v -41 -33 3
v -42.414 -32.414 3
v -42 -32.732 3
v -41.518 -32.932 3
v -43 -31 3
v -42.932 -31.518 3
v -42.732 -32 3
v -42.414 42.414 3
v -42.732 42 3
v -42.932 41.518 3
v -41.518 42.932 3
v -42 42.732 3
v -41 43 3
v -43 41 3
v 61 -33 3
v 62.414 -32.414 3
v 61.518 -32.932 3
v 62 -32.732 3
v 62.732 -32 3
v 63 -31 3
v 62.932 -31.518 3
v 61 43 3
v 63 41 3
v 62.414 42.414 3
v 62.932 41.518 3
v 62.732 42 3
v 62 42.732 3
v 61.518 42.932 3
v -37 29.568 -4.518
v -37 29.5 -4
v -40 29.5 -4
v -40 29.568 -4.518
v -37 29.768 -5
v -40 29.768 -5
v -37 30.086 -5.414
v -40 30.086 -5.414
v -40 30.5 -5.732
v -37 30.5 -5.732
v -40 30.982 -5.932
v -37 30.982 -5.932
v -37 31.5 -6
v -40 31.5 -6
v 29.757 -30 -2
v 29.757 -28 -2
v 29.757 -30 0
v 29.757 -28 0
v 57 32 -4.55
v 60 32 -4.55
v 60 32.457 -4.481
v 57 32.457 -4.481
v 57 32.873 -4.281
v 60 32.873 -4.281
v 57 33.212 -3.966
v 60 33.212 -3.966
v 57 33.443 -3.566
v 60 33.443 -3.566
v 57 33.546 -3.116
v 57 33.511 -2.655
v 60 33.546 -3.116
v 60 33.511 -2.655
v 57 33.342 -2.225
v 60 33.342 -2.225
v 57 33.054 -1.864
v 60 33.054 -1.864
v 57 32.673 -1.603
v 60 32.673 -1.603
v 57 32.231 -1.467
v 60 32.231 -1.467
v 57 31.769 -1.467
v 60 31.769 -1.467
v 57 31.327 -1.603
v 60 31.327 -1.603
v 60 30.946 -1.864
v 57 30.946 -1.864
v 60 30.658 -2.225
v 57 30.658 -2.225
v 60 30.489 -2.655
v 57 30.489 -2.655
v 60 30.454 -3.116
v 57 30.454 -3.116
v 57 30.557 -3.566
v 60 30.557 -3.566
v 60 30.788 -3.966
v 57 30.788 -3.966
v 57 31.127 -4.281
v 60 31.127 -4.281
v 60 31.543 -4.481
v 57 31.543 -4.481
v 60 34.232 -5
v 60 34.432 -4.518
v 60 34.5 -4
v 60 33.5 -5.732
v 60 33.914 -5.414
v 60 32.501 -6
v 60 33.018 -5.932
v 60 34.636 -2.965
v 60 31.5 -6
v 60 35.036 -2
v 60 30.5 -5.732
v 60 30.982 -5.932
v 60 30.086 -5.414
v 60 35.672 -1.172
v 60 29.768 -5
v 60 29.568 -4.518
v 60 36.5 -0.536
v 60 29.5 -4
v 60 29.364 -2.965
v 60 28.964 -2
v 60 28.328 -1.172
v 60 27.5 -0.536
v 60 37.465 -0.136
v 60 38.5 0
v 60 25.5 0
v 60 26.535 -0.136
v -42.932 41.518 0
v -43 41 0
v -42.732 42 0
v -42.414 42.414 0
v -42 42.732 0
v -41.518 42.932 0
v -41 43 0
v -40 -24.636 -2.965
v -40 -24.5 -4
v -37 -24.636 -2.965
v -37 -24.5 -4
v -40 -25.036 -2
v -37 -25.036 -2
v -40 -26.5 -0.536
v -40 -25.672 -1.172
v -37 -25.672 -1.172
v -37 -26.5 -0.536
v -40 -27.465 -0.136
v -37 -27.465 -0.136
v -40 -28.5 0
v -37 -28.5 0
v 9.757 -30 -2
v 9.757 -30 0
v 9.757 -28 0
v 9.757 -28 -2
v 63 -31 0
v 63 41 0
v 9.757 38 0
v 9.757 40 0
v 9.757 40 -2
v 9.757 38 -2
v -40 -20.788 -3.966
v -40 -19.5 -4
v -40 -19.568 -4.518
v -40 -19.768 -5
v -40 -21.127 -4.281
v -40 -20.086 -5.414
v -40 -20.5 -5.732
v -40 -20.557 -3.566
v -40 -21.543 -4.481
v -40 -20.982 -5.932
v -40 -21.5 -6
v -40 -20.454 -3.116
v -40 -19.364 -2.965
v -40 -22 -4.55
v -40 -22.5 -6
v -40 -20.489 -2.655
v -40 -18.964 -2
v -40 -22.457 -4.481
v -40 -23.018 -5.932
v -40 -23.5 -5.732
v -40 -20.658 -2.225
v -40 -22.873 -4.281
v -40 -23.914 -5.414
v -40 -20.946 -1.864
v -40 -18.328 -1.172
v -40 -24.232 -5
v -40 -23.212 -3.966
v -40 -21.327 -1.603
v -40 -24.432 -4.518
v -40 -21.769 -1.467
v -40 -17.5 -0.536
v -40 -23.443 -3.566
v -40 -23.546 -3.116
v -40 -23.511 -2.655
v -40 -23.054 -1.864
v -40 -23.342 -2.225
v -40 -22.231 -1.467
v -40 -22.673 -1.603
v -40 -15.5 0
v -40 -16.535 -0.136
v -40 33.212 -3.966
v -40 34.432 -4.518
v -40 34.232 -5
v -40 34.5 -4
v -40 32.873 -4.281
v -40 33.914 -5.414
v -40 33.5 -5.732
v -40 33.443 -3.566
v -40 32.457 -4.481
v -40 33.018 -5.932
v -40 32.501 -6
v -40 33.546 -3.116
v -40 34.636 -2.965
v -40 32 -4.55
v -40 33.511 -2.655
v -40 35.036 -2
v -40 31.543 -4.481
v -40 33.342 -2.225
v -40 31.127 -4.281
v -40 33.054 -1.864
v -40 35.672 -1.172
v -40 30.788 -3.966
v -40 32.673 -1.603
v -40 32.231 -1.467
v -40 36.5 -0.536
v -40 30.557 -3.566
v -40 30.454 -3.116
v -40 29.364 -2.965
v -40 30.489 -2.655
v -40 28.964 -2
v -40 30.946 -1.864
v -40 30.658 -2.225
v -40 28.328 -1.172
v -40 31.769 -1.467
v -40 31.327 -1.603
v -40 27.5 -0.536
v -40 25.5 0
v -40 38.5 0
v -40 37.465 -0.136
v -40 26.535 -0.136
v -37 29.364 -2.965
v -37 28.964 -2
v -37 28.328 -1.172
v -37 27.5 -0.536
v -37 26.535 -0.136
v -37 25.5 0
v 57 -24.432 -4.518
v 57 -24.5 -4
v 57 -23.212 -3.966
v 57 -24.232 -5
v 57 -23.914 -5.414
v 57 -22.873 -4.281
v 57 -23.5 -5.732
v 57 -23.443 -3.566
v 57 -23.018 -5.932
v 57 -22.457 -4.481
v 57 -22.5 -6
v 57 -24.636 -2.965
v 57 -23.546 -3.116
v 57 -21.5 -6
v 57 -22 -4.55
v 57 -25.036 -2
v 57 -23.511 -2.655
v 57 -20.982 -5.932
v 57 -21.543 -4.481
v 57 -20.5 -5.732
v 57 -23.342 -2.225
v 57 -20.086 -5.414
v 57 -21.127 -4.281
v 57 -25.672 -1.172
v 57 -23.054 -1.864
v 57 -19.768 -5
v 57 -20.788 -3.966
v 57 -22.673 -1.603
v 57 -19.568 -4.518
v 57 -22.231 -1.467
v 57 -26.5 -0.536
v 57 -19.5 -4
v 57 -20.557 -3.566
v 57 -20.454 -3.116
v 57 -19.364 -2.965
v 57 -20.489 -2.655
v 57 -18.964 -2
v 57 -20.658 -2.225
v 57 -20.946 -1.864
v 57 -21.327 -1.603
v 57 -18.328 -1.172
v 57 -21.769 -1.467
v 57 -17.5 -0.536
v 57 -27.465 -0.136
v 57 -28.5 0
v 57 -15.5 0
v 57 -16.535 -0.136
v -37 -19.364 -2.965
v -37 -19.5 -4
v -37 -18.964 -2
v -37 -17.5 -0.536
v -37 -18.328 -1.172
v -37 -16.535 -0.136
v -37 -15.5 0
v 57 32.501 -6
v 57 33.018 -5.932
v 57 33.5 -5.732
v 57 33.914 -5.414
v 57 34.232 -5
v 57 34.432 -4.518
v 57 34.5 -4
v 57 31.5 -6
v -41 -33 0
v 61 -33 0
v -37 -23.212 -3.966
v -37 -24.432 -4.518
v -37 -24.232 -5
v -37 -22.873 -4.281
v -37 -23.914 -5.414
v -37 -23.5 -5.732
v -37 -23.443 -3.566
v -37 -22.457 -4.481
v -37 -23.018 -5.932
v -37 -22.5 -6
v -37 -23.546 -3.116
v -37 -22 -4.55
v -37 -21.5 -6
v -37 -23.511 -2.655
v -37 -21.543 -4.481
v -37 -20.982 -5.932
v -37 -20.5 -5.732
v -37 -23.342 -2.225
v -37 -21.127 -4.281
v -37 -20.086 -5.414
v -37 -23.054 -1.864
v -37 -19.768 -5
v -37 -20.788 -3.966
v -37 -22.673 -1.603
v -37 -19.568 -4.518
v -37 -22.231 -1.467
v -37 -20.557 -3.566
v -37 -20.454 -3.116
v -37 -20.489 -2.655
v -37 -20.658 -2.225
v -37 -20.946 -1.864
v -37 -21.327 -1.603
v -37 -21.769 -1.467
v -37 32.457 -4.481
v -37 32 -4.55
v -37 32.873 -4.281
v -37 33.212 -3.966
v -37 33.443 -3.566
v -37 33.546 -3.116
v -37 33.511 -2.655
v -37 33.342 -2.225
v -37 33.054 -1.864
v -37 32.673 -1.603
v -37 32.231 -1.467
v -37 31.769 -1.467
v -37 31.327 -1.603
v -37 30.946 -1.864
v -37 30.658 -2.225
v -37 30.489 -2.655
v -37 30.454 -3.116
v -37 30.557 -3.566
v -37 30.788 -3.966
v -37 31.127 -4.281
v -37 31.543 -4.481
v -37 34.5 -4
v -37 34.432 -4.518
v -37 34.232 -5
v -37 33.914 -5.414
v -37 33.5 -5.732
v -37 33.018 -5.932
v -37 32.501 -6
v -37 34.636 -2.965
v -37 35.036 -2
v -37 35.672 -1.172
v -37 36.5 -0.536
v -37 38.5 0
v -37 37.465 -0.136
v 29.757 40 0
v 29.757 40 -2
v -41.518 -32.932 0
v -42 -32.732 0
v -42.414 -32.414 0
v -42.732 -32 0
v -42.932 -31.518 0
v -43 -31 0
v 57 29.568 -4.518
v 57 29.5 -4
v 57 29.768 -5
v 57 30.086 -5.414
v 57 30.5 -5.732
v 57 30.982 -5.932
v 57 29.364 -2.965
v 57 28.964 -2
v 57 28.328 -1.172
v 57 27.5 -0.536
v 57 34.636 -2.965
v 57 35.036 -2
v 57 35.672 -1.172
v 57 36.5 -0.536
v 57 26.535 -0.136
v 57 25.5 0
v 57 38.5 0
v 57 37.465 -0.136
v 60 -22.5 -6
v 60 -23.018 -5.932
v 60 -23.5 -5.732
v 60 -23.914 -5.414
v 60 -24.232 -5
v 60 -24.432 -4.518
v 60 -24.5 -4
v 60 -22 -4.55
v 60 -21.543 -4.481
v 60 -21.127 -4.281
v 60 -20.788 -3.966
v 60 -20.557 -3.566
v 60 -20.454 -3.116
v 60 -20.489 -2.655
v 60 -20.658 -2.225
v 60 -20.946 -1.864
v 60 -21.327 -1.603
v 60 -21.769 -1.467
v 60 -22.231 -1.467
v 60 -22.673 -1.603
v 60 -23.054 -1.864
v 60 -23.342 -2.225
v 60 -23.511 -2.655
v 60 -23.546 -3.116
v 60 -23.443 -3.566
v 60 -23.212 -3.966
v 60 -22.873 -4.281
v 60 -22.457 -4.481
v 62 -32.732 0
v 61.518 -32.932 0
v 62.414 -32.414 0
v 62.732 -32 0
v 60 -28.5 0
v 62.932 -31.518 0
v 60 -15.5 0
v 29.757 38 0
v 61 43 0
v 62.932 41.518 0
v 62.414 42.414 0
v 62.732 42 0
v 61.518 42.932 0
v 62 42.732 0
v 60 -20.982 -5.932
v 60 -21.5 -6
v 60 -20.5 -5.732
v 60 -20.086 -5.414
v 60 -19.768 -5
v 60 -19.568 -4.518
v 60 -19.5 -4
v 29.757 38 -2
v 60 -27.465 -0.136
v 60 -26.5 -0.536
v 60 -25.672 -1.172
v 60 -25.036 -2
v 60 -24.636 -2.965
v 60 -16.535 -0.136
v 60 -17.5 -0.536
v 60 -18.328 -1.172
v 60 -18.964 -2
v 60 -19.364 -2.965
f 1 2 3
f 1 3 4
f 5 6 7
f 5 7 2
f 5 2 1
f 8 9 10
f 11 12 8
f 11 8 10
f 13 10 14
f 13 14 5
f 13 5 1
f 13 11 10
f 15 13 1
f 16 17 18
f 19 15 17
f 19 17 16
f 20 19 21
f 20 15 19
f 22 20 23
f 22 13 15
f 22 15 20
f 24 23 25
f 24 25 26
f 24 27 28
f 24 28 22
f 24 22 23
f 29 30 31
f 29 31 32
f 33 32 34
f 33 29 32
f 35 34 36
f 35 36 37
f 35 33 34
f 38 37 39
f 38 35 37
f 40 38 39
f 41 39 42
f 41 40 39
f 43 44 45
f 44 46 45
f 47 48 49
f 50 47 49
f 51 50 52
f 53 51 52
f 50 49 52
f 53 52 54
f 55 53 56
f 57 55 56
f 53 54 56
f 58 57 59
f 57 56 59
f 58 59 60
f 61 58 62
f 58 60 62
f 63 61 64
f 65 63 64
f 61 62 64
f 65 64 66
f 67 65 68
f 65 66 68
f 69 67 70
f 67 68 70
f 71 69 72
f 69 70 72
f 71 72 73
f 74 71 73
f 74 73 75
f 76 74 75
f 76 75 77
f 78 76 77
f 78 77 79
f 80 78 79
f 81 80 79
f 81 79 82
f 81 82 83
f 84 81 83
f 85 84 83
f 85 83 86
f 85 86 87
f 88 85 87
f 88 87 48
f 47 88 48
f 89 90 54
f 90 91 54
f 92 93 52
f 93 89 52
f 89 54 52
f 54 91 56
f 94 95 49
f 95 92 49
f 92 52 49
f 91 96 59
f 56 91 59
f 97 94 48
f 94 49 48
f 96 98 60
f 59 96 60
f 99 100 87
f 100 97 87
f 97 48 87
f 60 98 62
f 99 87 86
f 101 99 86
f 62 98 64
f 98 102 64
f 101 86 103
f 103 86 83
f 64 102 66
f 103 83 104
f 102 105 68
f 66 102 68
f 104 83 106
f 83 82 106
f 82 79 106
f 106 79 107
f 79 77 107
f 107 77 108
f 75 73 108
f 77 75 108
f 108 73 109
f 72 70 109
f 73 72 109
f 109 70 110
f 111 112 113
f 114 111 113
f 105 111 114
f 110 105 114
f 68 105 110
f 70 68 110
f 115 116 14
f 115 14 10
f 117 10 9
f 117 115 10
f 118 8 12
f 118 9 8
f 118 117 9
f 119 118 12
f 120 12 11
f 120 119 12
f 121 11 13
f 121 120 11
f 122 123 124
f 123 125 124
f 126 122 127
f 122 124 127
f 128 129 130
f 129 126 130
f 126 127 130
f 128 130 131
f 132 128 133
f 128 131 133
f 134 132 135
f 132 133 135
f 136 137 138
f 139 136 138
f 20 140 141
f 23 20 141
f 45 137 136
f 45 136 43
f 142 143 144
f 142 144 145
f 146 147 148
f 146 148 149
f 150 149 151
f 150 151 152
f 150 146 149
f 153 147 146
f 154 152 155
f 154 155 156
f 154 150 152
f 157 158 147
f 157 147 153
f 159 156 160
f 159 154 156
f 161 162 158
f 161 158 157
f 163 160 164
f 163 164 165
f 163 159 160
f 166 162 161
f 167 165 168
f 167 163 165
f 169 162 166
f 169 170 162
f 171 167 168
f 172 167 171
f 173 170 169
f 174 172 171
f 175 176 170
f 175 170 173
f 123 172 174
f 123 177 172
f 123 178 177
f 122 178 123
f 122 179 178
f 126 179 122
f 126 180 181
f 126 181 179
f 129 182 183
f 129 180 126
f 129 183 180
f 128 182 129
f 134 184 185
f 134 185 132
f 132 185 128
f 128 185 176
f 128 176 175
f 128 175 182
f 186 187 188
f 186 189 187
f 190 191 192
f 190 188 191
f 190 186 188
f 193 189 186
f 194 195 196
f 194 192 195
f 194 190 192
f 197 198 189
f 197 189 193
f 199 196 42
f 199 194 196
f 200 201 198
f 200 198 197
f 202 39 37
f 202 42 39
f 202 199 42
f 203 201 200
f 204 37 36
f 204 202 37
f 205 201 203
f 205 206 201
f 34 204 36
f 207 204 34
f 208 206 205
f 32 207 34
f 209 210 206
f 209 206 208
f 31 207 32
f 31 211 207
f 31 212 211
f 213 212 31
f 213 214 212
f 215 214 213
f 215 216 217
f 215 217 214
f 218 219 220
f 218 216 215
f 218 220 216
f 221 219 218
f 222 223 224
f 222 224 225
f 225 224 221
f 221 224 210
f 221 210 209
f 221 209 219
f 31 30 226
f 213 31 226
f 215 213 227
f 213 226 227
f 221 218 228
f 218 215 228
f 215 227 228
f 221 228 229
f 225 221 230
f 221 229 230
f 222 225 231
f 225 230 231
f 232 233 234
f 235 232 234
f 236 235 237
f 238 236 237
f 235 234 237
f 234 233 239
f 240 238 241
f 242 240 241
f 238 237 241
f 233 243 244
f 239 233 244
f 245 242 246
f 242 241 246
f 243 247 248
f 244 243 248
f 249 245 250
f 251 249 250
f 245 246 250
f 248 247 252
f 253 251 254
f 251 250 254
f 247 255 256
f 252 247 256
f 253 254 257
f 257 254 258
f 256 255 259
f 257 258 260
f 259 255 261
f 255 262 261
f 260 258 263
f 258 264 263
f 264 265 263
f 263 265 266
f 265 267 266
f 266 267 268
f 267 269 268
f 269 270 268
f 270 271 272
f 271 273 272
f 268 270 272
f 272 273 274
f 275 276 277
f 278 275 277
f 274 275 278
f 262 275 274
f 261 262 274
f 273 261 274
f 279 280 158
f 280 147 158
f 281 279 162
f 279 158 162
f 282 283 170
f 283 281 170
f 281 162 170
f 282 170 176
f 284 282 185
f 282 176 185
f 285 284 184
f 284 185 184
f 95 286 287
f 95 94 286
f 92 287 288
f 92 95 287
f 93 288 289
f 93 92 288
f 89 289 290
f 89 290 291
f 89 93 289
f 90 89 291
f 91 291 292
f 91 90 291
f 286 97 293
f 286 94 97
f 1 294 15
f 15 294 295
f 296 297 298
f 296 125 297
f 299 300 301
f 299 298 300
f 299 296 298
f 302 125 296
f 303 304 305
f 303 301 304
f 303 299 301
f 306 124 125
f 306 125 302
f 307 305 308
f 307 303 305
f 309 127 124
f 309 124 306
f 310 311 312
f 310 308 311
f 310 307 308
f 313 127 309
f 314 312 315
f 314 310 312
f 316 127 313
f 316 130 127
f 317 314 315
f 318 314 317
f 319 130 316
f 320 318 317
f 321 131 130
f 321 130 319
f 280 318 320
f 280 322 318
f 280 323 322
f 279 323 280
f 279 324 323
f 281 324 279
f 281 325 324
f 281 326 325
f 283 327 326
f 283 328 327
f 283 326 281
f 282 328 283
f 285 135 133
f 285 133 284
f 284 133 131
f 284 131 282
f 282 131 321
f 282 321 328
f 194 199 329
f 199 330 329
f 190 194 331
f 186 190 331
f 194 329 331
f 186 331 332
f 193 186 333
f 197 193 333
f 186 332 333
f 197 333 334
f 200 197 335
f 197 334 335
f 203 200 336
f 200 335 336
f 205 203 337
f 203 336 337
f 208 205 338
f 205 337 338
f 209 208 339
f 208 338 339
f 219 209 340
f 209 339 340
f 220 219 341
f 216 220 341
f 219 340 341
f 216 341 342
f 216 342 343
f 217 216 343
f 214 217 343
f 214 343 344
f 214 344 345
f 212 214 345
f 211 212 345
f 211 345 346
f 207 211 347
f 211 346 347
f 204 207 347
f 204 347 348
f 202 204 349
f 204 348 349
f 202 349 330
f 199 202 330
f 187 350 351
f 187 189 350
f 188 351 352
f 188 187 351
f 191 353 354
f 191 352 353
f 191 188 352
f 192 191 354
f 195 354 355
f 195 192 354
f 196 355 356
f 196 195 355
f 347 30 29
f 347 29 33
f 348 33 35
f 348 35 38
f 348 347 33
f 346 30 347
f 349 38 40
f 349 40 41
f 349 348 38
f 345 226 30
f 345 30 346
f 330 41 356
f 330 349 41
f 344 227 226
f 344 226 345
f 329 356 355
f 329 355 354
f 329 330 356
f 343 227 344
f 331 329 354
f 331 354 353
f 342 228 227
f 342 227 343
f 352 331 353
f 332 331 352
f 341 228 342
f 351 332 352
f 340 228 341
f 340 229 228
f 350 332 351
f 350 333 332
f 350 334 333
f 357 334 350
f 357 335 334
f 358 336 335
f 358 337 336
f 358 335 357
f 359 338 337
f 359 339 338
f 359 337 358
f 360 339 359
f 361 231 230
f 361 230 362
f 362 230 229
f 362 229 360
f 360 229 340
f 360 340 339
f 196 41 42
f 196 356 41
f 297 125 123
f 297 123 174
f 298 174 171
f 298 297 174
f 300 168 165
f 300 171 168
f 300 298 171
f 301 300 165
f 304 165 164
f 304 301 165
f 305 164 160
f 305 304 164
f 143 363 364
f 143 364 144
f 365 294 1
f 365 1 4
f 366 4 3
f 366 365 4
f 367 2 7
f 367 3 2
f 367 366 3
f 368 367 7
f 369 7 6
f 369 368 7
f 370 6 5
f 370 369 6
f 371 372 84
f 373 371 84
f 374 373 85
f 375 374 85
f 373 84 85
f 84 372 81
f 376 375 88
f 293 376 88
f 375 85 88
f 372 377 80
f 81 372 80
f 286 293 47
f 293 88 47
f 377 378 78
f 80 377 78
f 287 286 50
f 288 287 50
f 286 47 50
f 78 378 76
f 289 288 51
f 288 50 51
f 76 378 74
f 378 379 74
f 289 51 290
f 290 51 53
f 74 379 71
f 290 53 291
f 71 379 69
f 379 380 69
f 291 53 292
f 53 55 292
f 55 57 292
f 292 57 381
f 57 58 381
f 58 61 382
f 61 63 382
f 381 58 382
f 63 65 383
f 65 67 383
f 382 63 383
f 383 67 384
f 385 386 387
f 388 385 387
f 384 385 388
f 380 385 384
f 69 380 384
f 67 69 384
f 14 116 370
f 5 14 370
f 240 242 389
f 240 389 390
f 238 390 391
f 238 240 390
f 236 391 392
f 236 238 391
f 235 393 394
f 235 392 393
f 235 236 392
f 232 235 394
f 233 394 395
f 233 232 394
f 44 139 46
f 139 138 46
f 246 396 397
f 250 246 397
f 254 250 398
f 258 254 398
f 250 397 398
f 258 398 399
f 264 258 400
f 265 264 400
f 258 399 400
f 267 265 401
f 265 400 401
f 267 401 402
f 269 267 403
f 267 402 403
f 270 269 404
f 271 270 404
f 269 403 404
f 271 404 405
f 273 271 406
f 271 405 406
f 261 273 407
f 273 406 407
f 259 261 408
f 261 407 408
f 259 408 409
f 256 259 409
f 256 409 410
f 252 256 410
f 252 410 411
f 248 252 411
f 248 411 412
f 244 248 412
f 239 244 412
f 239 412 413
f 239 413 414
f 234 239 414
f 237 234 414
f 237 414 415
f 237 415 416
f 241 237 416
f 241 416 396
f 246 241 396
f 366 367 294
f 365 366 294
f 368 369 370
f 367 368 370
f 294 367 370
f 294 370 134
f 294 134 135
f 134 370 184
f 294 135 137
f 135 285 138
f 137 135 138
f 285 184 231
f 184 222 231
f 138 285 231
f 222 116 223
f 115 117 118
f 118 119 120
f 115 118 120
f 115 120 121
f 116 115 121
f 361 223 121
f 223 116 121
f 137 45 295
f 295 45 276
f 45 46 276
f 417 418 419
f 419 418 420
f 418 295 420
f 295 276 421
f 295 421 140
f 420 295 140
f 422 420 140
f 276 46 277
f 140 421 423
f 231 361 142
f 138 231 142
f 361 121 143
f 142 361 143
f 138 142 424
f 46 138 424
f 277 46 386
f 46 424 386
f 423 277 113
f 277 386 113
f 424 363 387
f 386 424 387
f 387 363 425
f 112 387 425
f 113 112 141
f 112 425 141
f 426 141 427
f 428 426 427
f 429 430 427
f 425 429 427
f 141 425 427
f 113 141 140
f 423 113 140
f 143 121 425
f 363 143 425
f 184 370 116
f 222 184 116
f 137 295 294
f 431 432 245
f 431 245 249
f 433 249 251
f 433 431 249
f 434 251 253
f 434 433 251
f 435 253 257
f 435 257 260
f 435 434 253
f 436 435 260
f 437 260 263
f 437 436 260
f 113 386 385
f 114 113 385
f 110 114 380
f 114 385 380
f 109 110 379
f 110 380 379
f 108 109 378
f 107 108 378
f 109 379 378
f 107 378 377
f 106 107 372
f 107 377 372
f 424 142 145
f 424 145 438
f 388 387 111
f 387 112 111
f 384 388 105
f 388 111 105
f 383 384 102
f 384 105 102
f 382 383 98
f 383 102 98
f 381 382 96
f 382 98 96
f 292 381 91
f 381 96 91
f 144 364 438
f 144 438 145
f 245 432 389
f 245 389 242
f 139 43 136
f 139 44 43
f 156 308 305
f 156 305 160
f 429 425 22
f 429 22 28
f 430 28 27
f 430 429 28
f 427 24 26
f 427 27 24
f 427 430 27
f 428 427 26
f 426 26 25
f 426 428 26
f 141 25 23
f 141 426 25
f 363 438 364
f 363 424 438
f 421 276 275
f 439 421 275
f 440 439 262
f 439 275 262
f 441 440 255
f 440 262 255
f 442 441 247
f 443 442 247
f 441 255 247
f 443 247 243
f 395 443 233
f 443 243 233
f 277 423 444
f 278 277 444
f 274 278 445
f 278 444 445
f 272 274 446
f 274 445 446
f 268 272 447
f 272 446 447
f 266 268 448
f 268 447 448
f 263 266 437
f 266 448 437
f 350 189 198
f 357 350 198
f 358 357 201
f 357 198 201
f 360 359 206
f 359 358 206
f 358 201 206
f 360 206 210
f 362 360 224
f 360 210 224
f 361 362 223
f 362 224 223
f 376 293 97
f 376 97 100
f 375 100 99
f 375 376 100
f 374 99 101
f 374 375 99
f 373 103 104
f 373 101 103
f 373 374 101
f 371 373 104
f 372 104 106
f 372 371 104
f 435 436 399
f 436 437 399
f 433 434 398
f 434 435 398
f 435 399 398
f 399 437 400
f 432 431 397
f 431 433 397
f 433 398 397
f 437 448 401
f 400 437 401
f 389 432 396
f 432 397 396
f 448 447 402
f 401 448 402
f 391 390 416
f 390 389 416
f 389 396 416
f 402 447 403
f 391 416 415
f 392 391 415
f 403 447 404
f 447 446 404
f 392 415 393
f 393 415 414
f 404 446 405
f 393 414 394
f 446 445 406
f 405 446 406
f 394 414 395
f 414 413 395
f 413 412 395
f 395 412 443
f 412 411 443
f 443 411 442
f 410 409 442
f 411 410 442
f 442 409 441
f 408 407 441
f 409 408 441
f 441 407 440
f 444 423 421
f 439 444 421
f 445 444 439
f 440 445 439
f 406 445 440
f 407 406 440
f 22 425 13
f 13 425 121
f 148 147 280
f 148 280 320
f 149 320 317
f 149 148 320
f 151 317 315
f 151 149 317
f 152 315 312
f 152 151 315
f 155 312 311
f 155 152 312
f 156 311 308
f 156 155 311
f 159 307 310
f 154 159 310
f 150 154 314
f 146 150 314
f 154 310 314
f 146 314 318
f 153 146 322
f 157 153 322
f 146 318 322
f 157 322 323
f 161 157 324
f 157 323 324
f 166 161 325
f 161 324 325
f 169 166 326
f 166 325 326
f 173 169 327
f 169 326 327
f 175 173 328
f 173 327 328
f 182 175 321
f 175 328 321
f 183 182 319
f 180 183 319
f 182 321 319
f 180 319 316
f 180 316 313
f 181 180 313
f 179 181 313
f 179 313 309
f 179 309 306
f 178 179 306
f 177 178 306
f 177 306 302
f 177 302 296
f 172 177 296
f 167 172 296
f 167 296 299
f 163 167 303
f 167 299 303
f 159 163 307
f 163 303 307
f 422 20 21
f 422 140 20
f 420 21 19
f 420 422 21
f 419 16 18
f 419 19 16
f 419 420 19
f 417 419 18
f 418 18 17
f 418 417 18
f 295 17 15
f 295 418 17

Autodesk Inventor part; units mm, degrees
ref_plane "YZ Plane" through (0, 0, 0) normal (1, 0, 0) x (0, 1, 0)
ref_plane "XZ Plane" through (0, 0, 0) normal (0, 1, 0) x (-1, 0, 0)
ref_plane "XY Plane" through (0, 0, 0) normal (0, 0, 1) x (1, 0, 0)
ref_plane "Arbeitsebene1" through (0, 0, 0) normal (0, 0, 1) x (1, 0, 0)
sketch "Skizze1" plane through (0, 0, 0) normal (0, 0, 1) x (1, 0, 0)
  arc A0 (63, -2) -> (61, 0) centre (61, -2) ccw projected
  line L0 (61, 0) -> (60, 0) projected
  line L1 (60, 0) -> (60, -30) projected
  line L2 (60, -30) -> (-40, -30) projected
  line L3 (-40, -30) -> (-40, 40) projected
  line L4 (-40, 40) -> (60, 40) projected
  line L5 (60, 40) -> (60, 10) projected
  line L6 (60, 10) -> (61, 10) projected
  arc A1 (61, 10) -> (63, 12) centre (61, 12) ccw projected
  line L7 (63, 12) -> (63, 41) projected
  arc A2 (63, 41) -> (61, 43) centre (61, 41) ccw projected
  line L8 (61, 43) -> (-41, 43) projected
  arc A3 (-41, 43) -> (-43, 41) centre (-41, 41) ccw projected
  line L9 (-43, 41) -> (-43, -31) projected
  arc A4 (-43, -31) -> (-41, -33) centre (-41, -31) ccw projected
  line L10 (-41, -33) -> (61, -33) projected
  arc A5 (61, -33) -> (63, -31) centre (61, -31) ccw projected
  line L11 (63, -31) -> (63, -2) projected
  line L12 (63, 12) -> (63, -2)
  point P0 (0, 0)
extrude "Extrusion1" add sketch "Skizze1" along normal blind 3
sketch "Skizze2" plane through (0, 0, 0) normal (0, 0, -1) x (-1, 0, 0)
  line L0 (40, -30) -> (-60, -30) construction
  line L1 (-60, -30) -> (-60, 40) construction
  line L2 (-60, 40) -> (40, 40) construction
  line L3 (40, 40) -> (40, -30) construction
  line L4 (40, -24.5) -> (37, -24.5)
  line L5 (37, -24.5) -> (37, -19.5)
  line L6 (37, -19.5) -> (40, -19.5)
  line L7 (40, -19.5) -> (40, -24.5)
  line L8 (40, 29.5) -> (37, 29.5)
  line L9 (37, 29.5) -> (37, 34.5)
  line L10 (37, 34.5) -> (40, 34.5)
  line L11 (40, 34.5) -> (40, 29.5)
  line L12 (-60, -24.5) -> (-57, -24.5)
  line L13 (-57, -24.5) -> (-57, -19.5)
  line L14 (-57, -19.5) -> (-60, -19.5)
  line L15 (-60, -19.5) -> (-60, -24.5)
  line L16 (-60, 29.5) -> (-57, 29.5)
  line L17 (-57, 29.5) -> (-57, 34.5)
  line L18 (-57, 34.5) -> (-60, 34.5)
  line L19 (-60, 34.5) -> (-60, 29.5)
  line L20 (37, -22) -> (40, -22) construction
  line L21 (37, 32) -> (40, 32) construction
  point P0 (38.5, -22)
  dimension "d2" = 3
  dimension "d3" = 5
  dimension "d4" = 8
  dimension "d5" = 8
extrude "Extrusion2" add sketch "Skizze2" along normal blind 6
sketch "Skizze4" plane through (0, 0, 0) normal (0, 0, -1) x (-1, 0, 0)
  line L0 (-60, 40) -> (40, 40) projected
  line L1 (40, -30) -> (-60, -30) projected
  line L2 (-9.7574, 40) -> (-9.7574, 38)
  line L3 (-9.7574, 38) -> (-29.7574, 38)
  line L4 (-29.7574, 38) -> (-29.7574, 40)
  line L5 (-9.7574, -30) -> (-9.7574, -28)
  line L6 (-9.7574, -28) -> (-29.7574, -28)
  line L7 (-29.7574, -28) -> (-29.7574, -30)
  point P0 (0, 0)
  dimension "d10" = 2
  dimension "d11" = 20
extrude "Extrusion3" add sketch "Skizze4" along normal blind 2
fillet "Rundung1" radius 4 8 edges at (-38.5, 34.5, 0) (-38.5, 29.5, 0) (-38.5, -24.5, 0) (-38.5, -19.5, 0) (58.5, 34.5, 0) (58.5, -19.5, 0) (58.5, 29.5, 0) (58.5, -24.5, 0)
sketch "Skizze5" plane through (60, 29.5, -6) normal (1, 0, 0) x (0, 0, -1)
  circle A0 centre (-3, 2.5) radius 1.55 projected
  circle A1 centre (-3, -51.5) radius 1.55 projected
  point P0 (-6, -29.5)
extrude "Extrusion4" cut sketch "Skizze5" against normal through all
fillet "Rundung2" radius 2 8 edges at (58.5, 29.5, -6) (58.5, 34.5, -6) (58.5, -24.5, -6) (58.5, -19.5, -6) (-38.5, 29.5, -6) (-38.5, 34.5, -6) (-38.5, -24.5, -6) (-38.5, -19.5, -6)
properties part number "Box_Arduino_Oben_2"
